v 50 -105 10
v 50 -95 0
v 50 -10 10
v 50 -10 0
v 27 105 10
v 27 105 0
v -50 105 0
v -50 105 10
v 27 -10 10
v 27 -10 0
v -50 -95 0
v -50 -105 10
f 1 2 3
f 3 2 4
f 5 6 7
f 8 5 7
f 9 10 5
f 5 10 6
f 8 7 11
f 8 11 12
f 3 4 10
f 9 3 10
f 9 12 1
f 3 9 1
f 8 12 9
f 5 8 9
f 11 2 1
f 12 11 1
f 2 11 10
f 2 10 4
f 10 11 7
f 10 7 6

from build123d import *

# Parameters (mm, degrees)
BOSS_EXTRU_1_DEPTH      = 10
ENL_V_MAT_EXTRU_1_DEPTH = 100


with BuildPart() as part:
    # Esquisse1 → Boss.-Extru.1 (new body)
    with BuildSketch(Plane.XY):
        Polygon((-50, -105), (50, -105), (50, -10), (27, -10), (27, 105), (-50, 105), align=None)
    extrude(amount=BOSS_EXTRU_1_DEPTH)

    # Esquisse7 → Enlèv. mat.-Extru.1 (cut)
    with BuildSketch(Plane(origin=(50, 0, 0), x_dir=(0, 0, -1), z_dir=(1, 0, 0))):
        Polygon((-10, -105), (0, -105), (0, -95), align=None)
    extrude(amount=-ENL_V_MAT_EXTRU_1_DEPTH, mode=Mode.SUBTRACT)


solid = part.part
